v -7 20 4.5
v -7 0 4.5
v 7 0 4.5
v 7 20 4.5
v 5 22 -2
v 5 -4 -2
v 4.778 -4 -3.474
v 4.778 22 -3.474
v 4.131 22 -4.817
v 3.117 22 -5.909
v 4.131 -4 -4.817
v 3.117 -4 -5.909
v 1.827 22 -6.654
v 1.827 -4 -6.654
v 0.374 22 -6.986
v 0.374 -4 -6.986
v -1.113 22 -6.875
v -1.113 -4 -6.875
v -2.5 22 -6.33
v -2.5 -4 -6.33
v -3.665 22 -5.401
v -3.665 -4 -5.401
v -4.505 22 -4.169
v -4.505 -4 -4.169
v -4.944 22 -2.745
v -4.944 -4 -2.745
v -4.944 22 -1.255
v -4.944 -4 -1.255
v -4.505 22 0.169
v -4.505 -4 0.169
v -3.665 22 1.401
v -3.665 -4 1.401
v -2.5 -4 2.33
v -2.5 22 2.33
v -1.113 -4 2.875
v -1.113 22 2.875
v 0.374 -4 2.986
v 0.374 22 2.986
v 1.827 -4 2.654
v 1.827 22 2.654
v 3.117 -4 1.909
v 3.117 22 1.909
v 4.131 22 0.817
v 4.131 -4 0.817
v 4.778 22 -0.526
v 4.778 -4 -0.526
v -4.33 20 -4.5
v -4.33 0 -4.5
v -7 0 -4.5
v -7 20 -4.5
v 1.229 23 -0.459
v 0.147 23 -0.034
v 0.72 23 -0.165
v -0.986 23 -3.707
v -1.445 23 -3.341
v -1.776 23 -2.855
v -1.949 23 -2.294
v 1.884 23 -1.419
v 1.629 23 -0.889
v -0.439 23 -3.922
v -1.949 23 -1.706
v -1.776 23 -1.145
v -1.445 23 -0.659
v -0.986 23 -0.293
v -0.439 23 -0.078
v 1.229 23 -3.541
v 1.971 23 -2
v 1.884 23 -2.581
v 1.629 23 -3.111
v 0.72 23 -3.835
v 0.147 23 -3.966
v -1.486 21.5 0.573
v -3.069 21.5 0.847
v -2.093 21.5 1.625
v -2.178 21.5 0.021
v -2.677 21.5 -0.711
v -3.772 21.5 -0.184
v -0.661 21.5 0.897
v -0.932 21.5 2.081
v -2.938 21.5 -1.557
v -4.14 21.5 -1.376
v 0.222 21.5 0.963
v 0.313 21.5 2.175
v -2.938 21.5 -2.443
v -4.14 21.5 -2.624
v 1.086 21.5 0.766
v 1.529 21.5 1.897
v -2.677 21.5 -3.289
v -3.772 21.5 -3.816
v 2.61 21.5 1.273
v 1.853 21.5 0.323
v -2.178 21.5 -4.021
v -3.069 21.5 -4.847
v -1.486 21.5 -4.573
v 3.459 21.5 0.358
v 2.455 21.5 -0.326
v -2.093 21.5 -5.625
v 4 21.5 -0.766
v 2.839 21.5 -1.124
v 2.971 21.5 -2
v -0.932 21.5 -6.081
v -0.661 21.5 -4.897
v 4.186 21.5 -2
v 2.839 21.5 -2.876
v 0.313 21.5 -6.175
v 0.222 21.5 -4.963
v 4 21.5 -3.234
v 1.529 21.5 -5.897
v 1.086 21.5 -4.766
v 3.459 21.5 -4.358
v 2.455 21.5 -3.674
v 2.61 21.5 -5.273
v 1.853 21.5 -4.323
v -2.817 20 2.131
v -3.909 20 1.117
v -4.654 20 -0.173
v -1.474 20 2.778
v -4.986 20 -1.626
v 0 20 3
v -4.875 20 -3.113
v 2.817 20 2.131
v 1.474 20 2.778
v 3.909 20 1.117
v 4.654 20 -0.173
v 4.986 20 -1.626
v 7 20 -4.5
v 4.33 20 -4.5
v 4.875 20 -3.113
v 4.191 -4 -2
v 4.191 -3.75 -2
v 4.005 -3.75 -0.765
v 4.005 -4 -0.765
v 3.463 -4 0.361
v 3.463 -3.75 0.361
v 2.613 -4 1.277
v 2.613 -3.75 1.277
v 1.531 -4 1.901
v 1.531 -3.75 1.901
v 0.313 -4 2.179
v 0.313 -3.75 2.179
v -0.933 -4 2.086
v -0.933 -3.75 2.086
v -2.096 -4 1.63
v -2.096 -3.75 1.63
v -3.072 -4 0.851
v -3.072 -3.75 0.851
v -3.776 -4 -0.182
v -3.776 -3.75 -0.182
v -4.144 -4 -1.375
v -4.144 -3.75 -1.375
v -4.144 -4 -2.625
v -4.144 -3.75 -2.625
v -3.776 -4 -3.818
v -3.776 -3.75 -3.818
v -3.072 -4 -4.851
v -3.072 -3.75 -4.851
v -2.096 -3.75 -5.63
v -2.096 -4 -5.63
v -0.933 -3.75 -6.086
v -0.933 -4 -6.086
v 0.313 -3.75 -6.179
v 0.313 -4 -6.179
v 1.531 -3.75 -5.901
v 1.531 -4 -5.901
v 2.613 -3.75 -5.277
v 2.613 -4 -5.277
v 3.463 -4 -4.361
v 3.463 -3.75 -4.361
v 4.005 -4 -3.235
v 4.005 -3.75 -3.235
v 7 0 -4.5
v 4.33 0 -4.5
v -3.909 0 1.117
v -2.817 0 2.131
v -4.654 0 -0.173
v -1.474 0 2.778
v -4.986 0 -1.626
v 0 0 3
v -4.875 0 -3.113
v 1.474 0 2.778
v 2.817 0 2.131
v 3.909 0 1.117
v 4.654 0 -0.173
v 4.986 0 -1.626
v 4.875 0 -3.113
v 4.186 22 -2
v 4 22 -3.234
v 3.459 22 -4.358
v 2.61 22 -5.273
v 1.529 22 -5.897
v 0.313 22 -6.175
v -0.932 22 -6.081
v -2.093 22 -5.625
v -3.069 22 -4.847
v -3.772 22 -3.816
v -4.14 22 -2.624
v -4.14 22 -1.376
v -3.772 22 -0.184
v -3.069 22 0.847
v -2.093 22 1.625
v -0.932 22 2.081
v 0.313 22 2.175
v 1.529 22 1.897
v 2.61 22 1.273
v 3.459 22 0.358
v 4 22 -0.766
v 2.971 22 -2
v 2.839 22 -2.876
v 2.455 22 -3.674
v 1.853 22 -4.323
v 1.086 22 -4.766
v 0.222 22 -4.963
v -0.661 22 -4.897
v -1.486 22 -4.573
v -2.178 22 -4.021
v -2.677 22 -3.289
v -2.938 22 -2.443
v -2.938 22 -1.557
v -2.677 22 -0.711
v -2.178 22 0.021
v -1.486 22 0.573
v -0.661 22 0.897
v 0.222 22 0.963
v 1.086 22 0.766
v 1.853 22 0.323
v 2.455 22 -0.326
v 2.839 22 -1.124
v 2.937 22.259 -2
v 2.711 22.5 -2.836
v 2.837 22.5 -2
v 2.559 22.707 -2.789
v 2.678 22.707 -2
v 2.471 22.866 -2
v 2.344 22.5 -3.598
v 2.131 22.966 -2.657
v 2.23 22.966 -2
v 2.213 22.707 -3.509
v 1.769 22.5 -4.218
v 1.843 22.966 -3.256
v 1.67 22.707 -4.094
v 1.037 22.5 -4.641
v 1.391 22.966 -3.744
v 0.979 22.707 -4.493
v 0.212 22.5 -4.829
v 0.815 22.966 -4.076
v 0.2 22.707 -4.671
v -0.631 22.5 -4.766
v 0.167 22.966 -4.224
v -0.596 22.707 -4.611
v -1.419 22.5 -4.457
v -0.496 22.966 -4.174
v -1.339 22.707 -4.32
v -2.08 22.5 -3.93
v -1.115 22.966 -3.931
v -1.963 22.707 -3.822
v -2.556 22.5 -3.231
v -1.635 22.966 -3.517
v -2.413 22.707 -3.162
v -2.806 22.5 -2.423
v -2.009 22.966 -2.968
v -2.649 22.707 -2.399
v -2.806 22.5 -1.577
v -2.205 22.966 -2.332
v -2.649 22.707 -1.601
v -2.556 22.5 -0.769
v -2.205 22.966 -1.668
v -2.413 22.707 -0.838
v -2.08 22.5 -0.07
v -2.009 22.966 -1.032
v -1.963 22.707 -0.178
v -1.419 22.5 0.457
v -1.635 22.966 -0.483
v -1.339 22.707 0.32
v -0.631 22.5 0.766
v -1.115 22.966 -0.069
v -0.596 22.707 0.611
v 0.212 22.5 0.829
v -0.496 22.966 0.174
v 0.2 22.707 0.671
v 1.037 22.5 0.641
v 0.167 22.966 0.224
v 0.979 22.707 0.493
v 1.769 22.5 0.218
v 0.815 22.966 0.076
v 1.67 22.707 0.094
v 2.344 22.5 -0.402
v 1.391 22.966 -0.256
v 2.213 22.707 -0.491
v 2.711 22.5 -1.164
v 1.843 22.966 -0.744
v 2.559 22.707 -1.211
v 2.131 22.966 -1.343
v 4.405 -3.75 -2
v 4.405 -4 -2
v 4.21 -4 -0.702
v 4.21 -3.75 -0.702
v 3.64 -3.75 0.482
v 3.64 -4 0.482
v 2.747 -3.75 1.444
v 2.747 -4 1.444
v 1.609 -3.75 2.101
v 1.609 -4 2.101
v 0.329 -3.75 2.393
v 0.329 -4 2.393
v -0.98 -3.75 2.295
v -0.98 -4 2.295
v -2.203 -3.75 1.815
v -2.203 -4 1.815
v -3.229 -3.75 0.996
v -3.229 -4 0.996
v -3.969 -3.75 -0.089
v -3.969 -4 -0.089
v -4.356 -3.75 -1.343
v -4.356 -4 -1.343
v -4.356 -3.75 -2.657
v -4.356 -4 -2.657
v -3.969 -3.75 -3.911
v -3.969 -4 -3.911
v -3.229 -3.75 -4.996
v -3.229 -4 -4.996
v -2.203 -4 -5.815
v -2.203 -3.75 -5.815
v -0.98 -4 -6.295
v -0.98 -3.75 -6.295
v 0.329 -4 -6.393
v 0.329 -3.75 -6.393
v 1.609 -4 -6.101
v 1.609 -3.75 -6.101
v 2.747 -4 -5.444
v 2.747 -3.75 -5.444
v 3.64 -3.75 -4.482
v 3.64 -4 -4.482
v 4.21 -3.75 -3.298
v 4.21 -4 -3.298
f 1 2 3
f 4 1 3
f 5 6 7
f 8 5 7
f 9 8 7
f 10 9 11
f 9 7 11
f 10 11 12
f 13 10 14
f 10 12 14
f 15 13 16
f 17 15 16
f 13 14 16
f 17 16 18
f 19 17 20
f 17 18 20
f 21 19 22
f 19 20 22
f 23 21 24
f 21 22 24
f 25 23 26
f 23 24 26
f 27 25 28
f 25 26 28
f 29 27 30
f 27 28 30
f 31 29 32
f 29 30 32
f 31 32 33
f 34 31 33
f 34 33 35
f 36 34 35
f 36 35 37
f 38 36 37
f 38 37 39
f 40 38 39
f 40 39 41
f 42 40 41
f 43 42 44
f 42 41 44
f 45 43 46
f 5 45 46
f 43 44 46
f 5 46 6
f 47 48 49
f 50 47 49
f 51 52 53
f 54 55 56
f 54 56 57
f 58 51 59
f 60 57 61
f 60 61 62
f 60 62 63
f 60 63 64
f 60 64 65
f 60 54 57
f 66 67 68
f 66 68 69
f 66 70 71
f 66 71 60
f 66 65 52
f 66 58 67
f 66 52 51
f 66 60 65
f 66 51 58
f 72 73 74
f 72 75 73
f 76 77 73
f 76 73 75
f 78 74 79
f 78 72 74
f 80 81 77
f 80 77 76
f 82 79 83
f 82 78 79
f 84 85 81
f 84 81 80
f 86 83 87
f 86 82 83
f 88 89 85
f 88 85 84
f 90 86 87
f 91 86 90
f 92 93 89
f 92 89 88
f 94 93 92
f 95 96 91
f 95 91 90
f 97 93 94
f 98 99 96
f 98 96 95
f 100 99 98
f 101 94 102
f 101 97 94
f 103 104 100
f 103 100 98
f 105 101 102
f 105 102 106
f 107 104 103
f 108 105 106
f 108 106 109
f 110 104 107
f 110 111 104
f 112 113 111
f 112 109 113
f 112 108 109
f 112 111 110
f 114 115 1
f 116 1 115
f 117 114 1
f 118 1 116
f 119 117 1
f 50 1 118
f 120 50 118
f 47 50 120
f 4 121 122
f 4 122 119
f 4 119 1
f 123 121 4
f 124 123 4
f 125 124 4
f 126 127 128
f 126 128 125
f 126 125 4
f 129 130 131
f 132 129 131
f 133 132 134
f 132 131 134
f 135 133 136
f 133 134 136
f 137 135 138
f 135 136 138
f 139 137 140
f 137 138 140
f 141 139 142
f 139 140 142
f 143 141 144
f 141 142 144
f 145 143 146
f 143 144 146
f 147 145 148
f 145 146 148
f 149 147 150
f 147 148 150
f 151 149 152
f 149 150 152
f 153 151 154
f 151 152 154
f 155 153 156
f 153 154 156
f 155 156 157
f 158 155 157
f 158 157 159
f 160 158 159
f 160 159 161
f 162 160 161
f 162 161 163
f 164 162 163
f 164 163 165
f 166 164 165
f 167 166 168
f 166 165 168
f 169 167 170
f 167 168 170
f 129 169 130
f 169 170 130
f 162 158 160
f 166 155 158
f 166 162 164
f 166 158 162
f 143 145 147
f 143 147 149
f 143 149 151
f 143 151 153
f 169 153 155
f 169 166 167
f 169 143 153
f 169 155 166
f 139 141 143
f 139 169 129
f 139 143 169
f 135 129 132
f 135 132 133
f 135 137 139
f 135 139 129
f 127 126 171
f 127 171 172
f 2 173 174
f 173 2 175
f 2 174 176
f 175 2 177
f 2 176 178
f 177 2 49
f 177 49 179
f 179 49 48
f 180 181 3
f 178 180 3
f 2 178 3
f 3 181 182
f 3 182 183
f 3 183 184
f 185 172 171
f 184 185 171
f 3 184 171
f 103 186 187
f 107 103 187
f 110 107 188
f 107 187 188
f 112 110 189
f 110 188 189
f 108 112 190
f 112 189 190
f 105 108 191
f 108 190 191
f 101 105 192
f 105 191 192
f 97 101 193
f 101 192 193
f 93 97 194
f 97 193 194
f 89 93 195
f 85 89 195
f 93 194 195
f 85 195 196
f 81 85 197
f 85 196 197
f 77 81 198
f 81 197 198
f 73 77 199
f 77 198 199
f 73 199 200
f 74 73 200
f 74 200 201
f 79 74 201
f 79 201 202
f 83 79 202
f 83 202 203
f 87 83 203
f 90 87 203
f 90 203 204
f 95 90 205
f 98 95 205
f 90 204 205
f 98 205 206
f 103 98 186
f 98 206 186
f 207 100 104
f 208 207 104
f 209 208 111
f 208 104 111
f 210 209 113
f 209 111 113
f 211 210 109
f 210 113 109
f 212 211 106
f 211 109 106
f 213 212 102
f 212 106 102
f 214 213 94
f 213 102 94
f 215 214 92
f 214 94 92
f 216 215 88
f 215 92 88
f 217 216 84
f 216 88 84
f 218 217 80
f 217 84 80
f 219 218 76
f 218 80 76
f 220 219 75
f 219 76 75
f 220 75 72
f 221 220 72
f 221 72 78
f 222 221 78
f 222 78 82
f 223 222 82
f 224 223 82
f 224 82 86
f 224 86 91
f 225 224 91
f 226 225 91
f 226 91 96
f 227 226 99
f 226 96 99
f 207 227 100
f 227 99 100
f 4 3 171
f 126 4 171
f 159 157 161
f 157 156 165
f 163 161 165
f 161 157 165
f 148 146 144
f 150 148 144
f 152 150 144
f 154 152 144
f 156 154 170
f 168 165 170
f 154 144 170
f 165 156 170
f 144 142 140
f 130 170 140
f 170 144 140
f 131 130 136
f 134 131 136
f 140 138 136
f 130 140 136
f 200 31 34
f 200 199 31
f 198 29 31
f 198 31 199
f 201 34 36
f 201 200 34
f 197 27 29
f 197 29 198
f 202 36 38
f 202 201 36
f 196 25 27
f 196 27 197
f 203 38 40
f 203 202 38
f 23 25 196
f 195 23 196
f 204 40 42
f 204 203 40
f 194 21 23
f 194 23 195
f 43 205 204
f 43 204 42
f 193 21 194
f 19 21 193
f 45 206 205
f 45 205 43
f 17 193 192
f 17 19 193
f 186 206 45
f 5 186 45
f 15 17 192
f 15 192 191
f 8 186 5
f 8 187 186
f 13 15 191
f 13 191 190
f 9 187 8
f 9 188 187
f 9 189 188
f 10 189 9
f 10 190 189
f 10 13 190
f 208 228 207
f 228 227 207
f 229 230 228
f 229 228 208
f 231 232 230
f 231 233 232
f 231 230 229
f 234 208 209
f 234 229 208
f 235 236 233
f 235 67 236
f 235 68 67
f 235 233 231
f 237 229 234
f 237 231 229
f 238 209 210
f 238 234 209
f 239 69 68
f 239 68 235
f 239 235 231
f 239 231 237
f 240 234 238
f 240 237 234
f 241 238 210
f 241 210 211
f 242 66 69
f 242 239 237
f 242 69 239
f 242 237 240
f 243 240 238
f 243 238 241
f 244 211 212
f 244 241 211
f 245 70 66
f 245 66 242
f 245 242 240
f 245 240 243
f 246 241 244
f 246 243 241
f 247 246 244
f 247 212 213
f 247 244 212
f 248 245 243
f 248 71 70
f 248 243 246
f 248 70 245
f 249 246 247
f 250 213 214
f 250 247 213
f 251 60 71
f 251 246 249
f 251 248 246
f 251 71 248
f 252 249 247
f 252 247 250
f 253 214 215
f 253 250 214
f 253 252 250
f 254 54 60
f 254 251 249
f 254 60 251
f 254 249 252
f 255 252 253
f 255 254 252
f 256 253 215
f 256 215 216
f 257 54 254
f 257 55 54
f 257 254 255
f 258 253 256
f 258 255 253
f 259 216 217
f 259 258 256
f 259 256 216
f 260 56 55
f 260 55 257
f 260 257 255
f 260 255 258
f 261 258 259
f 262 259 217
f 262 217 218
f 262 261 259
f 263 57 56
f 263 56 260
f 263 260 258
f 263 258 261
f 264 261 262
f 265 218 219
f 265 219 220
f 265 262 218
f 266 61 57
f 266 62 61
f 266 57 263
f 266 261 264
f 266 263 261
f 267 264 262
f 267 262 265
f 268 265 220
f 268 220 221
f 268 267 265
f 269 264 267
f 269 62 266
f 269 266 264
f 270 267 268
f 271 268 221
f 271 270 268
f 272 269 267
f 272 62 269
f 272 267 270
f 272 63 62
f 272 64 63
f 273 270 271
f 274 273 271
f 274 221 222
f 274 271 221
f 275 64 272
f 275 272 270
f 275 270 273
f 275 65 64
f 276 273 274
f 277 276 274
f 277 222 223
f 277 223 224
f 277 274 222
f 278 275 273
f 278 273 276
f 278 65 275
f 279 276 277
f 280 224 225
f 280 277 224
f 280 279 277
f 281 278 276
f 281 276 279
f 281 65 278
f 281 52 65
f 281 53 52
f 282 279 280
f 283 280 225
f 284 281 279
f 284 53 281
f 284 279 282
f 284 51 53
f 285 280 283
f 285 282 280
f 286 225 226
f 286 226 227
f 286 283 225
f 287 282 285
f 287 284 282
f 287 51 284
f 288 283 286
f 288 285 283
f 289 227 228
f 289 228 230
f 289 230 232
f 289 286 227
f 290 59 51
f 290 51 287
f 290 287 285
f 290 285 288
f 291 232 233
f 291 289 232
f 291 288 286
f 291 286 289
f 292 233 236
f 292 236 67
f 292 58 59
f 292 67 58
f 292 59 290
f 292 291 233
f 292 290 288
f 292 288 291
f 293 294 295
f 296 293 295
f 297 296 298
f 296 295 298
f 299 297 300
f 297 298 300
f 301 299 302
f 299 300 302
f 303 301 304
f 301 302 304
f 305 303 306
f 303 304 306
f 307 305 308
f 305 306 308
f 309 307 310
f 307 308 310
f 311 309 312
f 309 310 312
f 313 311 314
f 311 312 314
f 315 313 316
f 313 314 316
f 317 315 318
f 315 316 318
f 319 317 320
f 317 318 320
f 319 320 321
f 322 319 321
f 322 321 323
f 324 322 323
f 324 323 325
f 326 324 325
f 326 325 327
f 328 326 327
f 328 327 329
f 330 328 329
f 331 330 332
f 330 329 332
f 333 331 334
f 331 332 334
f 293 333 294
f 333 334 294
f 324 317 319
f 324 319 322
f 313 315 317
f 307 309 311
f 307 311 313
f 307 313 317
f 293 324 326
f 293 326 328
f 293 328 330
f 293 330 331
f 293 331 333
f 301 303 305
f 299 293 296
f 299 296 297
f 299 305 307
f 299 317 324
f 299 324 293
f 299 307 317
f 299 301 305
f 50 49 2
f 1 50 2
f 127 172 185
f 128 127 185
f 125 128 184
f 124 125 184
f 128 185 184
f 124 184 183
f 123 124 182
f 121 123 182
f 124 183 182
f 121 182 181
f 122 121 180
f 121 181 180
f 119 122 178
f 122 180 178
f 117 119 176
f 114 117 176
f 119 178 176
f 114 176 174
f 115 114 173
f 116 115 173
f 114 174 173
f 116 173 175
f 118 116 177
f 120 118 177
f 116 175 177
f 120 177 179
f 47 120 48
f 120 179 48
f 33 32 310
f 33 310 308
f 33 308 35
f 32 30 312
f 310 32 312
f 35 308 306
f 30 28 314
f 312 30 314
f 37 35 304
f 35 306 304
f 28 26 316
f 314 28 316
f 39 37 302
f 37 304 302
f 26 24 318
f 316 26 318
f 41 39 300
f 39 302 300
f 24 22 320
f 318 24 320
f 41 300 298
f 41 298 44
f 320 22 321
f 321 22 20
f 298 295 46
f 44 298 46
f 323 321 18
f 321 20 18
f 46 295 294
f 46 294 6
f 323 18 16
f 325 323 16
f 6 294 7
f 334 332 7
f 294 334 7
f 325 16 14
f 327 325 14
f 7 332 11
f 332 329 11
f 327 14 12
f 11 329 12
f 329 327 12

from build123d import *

# Parameters (mm, degrees)
BOSS_EXTRUDE1_DEPTH = 20
BOSS_EXTRUDE2_START = -4
SKETCH2_R           = 5
BOSS_EXTRUDE2_DEPTH = 26
SKETCH3_R           = 4.186334937
CUT_EXTRUDE1_DEPTH  = 0.5
SKETCH4_R           = 2.971370829
BOSS_EXTRUDE3_DEPTH = 1.5
FILLET1_R           = 1
SKETCH5_R           = 4.405236738
CUT_EXTRUDE2_DEPTH  = 0.25
SKETCH6_R           = 4.191211996
BOSS_EXTRUDE4_DEPTH = 0.25


with BuildPart() as part:
    # Sketch1 → Boss-Extrude1 (new body)
    with BuildSketch(Plane(origin=(0, 0, 0), x_dir=(1, 0, 0), z_dir=(0, 1, 0))):
        with BuildLine():
            Line((-4.330127019, 4.5), (-7, 4.5))
            Line((-7, 4.5), (-7, -4.5))
            Line((-7, -4.5), (7, -4.5))
            Line((7, -4.5), (7, 4.5))
            Line((7, 4.5), (4.330127019, 4.5))
            ThreePointArc((4.330127019, 4.5), (0, -3), (-4.330127019, 4.5))
        make_face()
    extrude(amount=BOSS_EXTRUDE1_DEPTH)


with BuildPart() as body_2:
    # Sketch2 → Boss-Extrude2 (new body)
    with BuildSketch(Plane(origin=(0, 0, 0), x_dir=(1, 0, 0), z_dir=(0, 1, 0)).offset(BOSS_EXTRUDE2_START)):
        with Locations((0, 2)):
            Circle(SKETCH2_R)
    extrude(amount=BOSS_EXTRUDE2_DEPTH)

    # Sketch3 → Cut-Extrude1 (cut)
    with BuildSketch(Plane(origin=(0, 22, 0), x_dir=(1, 0, 0), z_dir=(0, 1, 0))):
        with Locations((0, 2)):
            Circle(SKETCH3_R)
    extrude(amount=-CUT_EXTRUDE1_DEPTH, mode=Mode.SUBTRACT)

    # Sketch4 → Boss-Extrude3 (add)
    with BuildSketch(Plane(origin=(0, 21.5, 0), x_dir=(1, 0, 0), z_dir=(0, 1, 0))):
        with Locations((0, 2)):
            Circle(SKETCH4_R)
    extrude(amount=BOSS_EXTRUDE3_DEPTH)

    # Fillet1
    fillet1_edges = [body_2.edges().sort_by_distance(p)[0] for p in [
        (-2.971370829, 23, -2),
    ]]
    fillet(fillet1_edges, radius=FILLET1_R)

    # Sketch5 → Cut-Extrude2 (cut)
    with BuildSketch(Plane.XZ.offset(4)):
        with Locations((0, -2)):
            Circle(SKETCH5_R)
    extrude(amount=-CUT_EXTRUDE2_DEPTH, mode=Mode.SUBTRACT)


with BuildPart() as body_3:
    # Sketch6 → Boss-Extrude4 (new body)
    with BuildSketch(Plane.XZ.offset(3.75)):
        with Locations((0, -2)):
            Circle(SKETCH6_R)
    extrude(amount=BOSS_EXTRUDE4_DEPTH)


solid = Compound([part.part, body_2.part, body_3.part])
